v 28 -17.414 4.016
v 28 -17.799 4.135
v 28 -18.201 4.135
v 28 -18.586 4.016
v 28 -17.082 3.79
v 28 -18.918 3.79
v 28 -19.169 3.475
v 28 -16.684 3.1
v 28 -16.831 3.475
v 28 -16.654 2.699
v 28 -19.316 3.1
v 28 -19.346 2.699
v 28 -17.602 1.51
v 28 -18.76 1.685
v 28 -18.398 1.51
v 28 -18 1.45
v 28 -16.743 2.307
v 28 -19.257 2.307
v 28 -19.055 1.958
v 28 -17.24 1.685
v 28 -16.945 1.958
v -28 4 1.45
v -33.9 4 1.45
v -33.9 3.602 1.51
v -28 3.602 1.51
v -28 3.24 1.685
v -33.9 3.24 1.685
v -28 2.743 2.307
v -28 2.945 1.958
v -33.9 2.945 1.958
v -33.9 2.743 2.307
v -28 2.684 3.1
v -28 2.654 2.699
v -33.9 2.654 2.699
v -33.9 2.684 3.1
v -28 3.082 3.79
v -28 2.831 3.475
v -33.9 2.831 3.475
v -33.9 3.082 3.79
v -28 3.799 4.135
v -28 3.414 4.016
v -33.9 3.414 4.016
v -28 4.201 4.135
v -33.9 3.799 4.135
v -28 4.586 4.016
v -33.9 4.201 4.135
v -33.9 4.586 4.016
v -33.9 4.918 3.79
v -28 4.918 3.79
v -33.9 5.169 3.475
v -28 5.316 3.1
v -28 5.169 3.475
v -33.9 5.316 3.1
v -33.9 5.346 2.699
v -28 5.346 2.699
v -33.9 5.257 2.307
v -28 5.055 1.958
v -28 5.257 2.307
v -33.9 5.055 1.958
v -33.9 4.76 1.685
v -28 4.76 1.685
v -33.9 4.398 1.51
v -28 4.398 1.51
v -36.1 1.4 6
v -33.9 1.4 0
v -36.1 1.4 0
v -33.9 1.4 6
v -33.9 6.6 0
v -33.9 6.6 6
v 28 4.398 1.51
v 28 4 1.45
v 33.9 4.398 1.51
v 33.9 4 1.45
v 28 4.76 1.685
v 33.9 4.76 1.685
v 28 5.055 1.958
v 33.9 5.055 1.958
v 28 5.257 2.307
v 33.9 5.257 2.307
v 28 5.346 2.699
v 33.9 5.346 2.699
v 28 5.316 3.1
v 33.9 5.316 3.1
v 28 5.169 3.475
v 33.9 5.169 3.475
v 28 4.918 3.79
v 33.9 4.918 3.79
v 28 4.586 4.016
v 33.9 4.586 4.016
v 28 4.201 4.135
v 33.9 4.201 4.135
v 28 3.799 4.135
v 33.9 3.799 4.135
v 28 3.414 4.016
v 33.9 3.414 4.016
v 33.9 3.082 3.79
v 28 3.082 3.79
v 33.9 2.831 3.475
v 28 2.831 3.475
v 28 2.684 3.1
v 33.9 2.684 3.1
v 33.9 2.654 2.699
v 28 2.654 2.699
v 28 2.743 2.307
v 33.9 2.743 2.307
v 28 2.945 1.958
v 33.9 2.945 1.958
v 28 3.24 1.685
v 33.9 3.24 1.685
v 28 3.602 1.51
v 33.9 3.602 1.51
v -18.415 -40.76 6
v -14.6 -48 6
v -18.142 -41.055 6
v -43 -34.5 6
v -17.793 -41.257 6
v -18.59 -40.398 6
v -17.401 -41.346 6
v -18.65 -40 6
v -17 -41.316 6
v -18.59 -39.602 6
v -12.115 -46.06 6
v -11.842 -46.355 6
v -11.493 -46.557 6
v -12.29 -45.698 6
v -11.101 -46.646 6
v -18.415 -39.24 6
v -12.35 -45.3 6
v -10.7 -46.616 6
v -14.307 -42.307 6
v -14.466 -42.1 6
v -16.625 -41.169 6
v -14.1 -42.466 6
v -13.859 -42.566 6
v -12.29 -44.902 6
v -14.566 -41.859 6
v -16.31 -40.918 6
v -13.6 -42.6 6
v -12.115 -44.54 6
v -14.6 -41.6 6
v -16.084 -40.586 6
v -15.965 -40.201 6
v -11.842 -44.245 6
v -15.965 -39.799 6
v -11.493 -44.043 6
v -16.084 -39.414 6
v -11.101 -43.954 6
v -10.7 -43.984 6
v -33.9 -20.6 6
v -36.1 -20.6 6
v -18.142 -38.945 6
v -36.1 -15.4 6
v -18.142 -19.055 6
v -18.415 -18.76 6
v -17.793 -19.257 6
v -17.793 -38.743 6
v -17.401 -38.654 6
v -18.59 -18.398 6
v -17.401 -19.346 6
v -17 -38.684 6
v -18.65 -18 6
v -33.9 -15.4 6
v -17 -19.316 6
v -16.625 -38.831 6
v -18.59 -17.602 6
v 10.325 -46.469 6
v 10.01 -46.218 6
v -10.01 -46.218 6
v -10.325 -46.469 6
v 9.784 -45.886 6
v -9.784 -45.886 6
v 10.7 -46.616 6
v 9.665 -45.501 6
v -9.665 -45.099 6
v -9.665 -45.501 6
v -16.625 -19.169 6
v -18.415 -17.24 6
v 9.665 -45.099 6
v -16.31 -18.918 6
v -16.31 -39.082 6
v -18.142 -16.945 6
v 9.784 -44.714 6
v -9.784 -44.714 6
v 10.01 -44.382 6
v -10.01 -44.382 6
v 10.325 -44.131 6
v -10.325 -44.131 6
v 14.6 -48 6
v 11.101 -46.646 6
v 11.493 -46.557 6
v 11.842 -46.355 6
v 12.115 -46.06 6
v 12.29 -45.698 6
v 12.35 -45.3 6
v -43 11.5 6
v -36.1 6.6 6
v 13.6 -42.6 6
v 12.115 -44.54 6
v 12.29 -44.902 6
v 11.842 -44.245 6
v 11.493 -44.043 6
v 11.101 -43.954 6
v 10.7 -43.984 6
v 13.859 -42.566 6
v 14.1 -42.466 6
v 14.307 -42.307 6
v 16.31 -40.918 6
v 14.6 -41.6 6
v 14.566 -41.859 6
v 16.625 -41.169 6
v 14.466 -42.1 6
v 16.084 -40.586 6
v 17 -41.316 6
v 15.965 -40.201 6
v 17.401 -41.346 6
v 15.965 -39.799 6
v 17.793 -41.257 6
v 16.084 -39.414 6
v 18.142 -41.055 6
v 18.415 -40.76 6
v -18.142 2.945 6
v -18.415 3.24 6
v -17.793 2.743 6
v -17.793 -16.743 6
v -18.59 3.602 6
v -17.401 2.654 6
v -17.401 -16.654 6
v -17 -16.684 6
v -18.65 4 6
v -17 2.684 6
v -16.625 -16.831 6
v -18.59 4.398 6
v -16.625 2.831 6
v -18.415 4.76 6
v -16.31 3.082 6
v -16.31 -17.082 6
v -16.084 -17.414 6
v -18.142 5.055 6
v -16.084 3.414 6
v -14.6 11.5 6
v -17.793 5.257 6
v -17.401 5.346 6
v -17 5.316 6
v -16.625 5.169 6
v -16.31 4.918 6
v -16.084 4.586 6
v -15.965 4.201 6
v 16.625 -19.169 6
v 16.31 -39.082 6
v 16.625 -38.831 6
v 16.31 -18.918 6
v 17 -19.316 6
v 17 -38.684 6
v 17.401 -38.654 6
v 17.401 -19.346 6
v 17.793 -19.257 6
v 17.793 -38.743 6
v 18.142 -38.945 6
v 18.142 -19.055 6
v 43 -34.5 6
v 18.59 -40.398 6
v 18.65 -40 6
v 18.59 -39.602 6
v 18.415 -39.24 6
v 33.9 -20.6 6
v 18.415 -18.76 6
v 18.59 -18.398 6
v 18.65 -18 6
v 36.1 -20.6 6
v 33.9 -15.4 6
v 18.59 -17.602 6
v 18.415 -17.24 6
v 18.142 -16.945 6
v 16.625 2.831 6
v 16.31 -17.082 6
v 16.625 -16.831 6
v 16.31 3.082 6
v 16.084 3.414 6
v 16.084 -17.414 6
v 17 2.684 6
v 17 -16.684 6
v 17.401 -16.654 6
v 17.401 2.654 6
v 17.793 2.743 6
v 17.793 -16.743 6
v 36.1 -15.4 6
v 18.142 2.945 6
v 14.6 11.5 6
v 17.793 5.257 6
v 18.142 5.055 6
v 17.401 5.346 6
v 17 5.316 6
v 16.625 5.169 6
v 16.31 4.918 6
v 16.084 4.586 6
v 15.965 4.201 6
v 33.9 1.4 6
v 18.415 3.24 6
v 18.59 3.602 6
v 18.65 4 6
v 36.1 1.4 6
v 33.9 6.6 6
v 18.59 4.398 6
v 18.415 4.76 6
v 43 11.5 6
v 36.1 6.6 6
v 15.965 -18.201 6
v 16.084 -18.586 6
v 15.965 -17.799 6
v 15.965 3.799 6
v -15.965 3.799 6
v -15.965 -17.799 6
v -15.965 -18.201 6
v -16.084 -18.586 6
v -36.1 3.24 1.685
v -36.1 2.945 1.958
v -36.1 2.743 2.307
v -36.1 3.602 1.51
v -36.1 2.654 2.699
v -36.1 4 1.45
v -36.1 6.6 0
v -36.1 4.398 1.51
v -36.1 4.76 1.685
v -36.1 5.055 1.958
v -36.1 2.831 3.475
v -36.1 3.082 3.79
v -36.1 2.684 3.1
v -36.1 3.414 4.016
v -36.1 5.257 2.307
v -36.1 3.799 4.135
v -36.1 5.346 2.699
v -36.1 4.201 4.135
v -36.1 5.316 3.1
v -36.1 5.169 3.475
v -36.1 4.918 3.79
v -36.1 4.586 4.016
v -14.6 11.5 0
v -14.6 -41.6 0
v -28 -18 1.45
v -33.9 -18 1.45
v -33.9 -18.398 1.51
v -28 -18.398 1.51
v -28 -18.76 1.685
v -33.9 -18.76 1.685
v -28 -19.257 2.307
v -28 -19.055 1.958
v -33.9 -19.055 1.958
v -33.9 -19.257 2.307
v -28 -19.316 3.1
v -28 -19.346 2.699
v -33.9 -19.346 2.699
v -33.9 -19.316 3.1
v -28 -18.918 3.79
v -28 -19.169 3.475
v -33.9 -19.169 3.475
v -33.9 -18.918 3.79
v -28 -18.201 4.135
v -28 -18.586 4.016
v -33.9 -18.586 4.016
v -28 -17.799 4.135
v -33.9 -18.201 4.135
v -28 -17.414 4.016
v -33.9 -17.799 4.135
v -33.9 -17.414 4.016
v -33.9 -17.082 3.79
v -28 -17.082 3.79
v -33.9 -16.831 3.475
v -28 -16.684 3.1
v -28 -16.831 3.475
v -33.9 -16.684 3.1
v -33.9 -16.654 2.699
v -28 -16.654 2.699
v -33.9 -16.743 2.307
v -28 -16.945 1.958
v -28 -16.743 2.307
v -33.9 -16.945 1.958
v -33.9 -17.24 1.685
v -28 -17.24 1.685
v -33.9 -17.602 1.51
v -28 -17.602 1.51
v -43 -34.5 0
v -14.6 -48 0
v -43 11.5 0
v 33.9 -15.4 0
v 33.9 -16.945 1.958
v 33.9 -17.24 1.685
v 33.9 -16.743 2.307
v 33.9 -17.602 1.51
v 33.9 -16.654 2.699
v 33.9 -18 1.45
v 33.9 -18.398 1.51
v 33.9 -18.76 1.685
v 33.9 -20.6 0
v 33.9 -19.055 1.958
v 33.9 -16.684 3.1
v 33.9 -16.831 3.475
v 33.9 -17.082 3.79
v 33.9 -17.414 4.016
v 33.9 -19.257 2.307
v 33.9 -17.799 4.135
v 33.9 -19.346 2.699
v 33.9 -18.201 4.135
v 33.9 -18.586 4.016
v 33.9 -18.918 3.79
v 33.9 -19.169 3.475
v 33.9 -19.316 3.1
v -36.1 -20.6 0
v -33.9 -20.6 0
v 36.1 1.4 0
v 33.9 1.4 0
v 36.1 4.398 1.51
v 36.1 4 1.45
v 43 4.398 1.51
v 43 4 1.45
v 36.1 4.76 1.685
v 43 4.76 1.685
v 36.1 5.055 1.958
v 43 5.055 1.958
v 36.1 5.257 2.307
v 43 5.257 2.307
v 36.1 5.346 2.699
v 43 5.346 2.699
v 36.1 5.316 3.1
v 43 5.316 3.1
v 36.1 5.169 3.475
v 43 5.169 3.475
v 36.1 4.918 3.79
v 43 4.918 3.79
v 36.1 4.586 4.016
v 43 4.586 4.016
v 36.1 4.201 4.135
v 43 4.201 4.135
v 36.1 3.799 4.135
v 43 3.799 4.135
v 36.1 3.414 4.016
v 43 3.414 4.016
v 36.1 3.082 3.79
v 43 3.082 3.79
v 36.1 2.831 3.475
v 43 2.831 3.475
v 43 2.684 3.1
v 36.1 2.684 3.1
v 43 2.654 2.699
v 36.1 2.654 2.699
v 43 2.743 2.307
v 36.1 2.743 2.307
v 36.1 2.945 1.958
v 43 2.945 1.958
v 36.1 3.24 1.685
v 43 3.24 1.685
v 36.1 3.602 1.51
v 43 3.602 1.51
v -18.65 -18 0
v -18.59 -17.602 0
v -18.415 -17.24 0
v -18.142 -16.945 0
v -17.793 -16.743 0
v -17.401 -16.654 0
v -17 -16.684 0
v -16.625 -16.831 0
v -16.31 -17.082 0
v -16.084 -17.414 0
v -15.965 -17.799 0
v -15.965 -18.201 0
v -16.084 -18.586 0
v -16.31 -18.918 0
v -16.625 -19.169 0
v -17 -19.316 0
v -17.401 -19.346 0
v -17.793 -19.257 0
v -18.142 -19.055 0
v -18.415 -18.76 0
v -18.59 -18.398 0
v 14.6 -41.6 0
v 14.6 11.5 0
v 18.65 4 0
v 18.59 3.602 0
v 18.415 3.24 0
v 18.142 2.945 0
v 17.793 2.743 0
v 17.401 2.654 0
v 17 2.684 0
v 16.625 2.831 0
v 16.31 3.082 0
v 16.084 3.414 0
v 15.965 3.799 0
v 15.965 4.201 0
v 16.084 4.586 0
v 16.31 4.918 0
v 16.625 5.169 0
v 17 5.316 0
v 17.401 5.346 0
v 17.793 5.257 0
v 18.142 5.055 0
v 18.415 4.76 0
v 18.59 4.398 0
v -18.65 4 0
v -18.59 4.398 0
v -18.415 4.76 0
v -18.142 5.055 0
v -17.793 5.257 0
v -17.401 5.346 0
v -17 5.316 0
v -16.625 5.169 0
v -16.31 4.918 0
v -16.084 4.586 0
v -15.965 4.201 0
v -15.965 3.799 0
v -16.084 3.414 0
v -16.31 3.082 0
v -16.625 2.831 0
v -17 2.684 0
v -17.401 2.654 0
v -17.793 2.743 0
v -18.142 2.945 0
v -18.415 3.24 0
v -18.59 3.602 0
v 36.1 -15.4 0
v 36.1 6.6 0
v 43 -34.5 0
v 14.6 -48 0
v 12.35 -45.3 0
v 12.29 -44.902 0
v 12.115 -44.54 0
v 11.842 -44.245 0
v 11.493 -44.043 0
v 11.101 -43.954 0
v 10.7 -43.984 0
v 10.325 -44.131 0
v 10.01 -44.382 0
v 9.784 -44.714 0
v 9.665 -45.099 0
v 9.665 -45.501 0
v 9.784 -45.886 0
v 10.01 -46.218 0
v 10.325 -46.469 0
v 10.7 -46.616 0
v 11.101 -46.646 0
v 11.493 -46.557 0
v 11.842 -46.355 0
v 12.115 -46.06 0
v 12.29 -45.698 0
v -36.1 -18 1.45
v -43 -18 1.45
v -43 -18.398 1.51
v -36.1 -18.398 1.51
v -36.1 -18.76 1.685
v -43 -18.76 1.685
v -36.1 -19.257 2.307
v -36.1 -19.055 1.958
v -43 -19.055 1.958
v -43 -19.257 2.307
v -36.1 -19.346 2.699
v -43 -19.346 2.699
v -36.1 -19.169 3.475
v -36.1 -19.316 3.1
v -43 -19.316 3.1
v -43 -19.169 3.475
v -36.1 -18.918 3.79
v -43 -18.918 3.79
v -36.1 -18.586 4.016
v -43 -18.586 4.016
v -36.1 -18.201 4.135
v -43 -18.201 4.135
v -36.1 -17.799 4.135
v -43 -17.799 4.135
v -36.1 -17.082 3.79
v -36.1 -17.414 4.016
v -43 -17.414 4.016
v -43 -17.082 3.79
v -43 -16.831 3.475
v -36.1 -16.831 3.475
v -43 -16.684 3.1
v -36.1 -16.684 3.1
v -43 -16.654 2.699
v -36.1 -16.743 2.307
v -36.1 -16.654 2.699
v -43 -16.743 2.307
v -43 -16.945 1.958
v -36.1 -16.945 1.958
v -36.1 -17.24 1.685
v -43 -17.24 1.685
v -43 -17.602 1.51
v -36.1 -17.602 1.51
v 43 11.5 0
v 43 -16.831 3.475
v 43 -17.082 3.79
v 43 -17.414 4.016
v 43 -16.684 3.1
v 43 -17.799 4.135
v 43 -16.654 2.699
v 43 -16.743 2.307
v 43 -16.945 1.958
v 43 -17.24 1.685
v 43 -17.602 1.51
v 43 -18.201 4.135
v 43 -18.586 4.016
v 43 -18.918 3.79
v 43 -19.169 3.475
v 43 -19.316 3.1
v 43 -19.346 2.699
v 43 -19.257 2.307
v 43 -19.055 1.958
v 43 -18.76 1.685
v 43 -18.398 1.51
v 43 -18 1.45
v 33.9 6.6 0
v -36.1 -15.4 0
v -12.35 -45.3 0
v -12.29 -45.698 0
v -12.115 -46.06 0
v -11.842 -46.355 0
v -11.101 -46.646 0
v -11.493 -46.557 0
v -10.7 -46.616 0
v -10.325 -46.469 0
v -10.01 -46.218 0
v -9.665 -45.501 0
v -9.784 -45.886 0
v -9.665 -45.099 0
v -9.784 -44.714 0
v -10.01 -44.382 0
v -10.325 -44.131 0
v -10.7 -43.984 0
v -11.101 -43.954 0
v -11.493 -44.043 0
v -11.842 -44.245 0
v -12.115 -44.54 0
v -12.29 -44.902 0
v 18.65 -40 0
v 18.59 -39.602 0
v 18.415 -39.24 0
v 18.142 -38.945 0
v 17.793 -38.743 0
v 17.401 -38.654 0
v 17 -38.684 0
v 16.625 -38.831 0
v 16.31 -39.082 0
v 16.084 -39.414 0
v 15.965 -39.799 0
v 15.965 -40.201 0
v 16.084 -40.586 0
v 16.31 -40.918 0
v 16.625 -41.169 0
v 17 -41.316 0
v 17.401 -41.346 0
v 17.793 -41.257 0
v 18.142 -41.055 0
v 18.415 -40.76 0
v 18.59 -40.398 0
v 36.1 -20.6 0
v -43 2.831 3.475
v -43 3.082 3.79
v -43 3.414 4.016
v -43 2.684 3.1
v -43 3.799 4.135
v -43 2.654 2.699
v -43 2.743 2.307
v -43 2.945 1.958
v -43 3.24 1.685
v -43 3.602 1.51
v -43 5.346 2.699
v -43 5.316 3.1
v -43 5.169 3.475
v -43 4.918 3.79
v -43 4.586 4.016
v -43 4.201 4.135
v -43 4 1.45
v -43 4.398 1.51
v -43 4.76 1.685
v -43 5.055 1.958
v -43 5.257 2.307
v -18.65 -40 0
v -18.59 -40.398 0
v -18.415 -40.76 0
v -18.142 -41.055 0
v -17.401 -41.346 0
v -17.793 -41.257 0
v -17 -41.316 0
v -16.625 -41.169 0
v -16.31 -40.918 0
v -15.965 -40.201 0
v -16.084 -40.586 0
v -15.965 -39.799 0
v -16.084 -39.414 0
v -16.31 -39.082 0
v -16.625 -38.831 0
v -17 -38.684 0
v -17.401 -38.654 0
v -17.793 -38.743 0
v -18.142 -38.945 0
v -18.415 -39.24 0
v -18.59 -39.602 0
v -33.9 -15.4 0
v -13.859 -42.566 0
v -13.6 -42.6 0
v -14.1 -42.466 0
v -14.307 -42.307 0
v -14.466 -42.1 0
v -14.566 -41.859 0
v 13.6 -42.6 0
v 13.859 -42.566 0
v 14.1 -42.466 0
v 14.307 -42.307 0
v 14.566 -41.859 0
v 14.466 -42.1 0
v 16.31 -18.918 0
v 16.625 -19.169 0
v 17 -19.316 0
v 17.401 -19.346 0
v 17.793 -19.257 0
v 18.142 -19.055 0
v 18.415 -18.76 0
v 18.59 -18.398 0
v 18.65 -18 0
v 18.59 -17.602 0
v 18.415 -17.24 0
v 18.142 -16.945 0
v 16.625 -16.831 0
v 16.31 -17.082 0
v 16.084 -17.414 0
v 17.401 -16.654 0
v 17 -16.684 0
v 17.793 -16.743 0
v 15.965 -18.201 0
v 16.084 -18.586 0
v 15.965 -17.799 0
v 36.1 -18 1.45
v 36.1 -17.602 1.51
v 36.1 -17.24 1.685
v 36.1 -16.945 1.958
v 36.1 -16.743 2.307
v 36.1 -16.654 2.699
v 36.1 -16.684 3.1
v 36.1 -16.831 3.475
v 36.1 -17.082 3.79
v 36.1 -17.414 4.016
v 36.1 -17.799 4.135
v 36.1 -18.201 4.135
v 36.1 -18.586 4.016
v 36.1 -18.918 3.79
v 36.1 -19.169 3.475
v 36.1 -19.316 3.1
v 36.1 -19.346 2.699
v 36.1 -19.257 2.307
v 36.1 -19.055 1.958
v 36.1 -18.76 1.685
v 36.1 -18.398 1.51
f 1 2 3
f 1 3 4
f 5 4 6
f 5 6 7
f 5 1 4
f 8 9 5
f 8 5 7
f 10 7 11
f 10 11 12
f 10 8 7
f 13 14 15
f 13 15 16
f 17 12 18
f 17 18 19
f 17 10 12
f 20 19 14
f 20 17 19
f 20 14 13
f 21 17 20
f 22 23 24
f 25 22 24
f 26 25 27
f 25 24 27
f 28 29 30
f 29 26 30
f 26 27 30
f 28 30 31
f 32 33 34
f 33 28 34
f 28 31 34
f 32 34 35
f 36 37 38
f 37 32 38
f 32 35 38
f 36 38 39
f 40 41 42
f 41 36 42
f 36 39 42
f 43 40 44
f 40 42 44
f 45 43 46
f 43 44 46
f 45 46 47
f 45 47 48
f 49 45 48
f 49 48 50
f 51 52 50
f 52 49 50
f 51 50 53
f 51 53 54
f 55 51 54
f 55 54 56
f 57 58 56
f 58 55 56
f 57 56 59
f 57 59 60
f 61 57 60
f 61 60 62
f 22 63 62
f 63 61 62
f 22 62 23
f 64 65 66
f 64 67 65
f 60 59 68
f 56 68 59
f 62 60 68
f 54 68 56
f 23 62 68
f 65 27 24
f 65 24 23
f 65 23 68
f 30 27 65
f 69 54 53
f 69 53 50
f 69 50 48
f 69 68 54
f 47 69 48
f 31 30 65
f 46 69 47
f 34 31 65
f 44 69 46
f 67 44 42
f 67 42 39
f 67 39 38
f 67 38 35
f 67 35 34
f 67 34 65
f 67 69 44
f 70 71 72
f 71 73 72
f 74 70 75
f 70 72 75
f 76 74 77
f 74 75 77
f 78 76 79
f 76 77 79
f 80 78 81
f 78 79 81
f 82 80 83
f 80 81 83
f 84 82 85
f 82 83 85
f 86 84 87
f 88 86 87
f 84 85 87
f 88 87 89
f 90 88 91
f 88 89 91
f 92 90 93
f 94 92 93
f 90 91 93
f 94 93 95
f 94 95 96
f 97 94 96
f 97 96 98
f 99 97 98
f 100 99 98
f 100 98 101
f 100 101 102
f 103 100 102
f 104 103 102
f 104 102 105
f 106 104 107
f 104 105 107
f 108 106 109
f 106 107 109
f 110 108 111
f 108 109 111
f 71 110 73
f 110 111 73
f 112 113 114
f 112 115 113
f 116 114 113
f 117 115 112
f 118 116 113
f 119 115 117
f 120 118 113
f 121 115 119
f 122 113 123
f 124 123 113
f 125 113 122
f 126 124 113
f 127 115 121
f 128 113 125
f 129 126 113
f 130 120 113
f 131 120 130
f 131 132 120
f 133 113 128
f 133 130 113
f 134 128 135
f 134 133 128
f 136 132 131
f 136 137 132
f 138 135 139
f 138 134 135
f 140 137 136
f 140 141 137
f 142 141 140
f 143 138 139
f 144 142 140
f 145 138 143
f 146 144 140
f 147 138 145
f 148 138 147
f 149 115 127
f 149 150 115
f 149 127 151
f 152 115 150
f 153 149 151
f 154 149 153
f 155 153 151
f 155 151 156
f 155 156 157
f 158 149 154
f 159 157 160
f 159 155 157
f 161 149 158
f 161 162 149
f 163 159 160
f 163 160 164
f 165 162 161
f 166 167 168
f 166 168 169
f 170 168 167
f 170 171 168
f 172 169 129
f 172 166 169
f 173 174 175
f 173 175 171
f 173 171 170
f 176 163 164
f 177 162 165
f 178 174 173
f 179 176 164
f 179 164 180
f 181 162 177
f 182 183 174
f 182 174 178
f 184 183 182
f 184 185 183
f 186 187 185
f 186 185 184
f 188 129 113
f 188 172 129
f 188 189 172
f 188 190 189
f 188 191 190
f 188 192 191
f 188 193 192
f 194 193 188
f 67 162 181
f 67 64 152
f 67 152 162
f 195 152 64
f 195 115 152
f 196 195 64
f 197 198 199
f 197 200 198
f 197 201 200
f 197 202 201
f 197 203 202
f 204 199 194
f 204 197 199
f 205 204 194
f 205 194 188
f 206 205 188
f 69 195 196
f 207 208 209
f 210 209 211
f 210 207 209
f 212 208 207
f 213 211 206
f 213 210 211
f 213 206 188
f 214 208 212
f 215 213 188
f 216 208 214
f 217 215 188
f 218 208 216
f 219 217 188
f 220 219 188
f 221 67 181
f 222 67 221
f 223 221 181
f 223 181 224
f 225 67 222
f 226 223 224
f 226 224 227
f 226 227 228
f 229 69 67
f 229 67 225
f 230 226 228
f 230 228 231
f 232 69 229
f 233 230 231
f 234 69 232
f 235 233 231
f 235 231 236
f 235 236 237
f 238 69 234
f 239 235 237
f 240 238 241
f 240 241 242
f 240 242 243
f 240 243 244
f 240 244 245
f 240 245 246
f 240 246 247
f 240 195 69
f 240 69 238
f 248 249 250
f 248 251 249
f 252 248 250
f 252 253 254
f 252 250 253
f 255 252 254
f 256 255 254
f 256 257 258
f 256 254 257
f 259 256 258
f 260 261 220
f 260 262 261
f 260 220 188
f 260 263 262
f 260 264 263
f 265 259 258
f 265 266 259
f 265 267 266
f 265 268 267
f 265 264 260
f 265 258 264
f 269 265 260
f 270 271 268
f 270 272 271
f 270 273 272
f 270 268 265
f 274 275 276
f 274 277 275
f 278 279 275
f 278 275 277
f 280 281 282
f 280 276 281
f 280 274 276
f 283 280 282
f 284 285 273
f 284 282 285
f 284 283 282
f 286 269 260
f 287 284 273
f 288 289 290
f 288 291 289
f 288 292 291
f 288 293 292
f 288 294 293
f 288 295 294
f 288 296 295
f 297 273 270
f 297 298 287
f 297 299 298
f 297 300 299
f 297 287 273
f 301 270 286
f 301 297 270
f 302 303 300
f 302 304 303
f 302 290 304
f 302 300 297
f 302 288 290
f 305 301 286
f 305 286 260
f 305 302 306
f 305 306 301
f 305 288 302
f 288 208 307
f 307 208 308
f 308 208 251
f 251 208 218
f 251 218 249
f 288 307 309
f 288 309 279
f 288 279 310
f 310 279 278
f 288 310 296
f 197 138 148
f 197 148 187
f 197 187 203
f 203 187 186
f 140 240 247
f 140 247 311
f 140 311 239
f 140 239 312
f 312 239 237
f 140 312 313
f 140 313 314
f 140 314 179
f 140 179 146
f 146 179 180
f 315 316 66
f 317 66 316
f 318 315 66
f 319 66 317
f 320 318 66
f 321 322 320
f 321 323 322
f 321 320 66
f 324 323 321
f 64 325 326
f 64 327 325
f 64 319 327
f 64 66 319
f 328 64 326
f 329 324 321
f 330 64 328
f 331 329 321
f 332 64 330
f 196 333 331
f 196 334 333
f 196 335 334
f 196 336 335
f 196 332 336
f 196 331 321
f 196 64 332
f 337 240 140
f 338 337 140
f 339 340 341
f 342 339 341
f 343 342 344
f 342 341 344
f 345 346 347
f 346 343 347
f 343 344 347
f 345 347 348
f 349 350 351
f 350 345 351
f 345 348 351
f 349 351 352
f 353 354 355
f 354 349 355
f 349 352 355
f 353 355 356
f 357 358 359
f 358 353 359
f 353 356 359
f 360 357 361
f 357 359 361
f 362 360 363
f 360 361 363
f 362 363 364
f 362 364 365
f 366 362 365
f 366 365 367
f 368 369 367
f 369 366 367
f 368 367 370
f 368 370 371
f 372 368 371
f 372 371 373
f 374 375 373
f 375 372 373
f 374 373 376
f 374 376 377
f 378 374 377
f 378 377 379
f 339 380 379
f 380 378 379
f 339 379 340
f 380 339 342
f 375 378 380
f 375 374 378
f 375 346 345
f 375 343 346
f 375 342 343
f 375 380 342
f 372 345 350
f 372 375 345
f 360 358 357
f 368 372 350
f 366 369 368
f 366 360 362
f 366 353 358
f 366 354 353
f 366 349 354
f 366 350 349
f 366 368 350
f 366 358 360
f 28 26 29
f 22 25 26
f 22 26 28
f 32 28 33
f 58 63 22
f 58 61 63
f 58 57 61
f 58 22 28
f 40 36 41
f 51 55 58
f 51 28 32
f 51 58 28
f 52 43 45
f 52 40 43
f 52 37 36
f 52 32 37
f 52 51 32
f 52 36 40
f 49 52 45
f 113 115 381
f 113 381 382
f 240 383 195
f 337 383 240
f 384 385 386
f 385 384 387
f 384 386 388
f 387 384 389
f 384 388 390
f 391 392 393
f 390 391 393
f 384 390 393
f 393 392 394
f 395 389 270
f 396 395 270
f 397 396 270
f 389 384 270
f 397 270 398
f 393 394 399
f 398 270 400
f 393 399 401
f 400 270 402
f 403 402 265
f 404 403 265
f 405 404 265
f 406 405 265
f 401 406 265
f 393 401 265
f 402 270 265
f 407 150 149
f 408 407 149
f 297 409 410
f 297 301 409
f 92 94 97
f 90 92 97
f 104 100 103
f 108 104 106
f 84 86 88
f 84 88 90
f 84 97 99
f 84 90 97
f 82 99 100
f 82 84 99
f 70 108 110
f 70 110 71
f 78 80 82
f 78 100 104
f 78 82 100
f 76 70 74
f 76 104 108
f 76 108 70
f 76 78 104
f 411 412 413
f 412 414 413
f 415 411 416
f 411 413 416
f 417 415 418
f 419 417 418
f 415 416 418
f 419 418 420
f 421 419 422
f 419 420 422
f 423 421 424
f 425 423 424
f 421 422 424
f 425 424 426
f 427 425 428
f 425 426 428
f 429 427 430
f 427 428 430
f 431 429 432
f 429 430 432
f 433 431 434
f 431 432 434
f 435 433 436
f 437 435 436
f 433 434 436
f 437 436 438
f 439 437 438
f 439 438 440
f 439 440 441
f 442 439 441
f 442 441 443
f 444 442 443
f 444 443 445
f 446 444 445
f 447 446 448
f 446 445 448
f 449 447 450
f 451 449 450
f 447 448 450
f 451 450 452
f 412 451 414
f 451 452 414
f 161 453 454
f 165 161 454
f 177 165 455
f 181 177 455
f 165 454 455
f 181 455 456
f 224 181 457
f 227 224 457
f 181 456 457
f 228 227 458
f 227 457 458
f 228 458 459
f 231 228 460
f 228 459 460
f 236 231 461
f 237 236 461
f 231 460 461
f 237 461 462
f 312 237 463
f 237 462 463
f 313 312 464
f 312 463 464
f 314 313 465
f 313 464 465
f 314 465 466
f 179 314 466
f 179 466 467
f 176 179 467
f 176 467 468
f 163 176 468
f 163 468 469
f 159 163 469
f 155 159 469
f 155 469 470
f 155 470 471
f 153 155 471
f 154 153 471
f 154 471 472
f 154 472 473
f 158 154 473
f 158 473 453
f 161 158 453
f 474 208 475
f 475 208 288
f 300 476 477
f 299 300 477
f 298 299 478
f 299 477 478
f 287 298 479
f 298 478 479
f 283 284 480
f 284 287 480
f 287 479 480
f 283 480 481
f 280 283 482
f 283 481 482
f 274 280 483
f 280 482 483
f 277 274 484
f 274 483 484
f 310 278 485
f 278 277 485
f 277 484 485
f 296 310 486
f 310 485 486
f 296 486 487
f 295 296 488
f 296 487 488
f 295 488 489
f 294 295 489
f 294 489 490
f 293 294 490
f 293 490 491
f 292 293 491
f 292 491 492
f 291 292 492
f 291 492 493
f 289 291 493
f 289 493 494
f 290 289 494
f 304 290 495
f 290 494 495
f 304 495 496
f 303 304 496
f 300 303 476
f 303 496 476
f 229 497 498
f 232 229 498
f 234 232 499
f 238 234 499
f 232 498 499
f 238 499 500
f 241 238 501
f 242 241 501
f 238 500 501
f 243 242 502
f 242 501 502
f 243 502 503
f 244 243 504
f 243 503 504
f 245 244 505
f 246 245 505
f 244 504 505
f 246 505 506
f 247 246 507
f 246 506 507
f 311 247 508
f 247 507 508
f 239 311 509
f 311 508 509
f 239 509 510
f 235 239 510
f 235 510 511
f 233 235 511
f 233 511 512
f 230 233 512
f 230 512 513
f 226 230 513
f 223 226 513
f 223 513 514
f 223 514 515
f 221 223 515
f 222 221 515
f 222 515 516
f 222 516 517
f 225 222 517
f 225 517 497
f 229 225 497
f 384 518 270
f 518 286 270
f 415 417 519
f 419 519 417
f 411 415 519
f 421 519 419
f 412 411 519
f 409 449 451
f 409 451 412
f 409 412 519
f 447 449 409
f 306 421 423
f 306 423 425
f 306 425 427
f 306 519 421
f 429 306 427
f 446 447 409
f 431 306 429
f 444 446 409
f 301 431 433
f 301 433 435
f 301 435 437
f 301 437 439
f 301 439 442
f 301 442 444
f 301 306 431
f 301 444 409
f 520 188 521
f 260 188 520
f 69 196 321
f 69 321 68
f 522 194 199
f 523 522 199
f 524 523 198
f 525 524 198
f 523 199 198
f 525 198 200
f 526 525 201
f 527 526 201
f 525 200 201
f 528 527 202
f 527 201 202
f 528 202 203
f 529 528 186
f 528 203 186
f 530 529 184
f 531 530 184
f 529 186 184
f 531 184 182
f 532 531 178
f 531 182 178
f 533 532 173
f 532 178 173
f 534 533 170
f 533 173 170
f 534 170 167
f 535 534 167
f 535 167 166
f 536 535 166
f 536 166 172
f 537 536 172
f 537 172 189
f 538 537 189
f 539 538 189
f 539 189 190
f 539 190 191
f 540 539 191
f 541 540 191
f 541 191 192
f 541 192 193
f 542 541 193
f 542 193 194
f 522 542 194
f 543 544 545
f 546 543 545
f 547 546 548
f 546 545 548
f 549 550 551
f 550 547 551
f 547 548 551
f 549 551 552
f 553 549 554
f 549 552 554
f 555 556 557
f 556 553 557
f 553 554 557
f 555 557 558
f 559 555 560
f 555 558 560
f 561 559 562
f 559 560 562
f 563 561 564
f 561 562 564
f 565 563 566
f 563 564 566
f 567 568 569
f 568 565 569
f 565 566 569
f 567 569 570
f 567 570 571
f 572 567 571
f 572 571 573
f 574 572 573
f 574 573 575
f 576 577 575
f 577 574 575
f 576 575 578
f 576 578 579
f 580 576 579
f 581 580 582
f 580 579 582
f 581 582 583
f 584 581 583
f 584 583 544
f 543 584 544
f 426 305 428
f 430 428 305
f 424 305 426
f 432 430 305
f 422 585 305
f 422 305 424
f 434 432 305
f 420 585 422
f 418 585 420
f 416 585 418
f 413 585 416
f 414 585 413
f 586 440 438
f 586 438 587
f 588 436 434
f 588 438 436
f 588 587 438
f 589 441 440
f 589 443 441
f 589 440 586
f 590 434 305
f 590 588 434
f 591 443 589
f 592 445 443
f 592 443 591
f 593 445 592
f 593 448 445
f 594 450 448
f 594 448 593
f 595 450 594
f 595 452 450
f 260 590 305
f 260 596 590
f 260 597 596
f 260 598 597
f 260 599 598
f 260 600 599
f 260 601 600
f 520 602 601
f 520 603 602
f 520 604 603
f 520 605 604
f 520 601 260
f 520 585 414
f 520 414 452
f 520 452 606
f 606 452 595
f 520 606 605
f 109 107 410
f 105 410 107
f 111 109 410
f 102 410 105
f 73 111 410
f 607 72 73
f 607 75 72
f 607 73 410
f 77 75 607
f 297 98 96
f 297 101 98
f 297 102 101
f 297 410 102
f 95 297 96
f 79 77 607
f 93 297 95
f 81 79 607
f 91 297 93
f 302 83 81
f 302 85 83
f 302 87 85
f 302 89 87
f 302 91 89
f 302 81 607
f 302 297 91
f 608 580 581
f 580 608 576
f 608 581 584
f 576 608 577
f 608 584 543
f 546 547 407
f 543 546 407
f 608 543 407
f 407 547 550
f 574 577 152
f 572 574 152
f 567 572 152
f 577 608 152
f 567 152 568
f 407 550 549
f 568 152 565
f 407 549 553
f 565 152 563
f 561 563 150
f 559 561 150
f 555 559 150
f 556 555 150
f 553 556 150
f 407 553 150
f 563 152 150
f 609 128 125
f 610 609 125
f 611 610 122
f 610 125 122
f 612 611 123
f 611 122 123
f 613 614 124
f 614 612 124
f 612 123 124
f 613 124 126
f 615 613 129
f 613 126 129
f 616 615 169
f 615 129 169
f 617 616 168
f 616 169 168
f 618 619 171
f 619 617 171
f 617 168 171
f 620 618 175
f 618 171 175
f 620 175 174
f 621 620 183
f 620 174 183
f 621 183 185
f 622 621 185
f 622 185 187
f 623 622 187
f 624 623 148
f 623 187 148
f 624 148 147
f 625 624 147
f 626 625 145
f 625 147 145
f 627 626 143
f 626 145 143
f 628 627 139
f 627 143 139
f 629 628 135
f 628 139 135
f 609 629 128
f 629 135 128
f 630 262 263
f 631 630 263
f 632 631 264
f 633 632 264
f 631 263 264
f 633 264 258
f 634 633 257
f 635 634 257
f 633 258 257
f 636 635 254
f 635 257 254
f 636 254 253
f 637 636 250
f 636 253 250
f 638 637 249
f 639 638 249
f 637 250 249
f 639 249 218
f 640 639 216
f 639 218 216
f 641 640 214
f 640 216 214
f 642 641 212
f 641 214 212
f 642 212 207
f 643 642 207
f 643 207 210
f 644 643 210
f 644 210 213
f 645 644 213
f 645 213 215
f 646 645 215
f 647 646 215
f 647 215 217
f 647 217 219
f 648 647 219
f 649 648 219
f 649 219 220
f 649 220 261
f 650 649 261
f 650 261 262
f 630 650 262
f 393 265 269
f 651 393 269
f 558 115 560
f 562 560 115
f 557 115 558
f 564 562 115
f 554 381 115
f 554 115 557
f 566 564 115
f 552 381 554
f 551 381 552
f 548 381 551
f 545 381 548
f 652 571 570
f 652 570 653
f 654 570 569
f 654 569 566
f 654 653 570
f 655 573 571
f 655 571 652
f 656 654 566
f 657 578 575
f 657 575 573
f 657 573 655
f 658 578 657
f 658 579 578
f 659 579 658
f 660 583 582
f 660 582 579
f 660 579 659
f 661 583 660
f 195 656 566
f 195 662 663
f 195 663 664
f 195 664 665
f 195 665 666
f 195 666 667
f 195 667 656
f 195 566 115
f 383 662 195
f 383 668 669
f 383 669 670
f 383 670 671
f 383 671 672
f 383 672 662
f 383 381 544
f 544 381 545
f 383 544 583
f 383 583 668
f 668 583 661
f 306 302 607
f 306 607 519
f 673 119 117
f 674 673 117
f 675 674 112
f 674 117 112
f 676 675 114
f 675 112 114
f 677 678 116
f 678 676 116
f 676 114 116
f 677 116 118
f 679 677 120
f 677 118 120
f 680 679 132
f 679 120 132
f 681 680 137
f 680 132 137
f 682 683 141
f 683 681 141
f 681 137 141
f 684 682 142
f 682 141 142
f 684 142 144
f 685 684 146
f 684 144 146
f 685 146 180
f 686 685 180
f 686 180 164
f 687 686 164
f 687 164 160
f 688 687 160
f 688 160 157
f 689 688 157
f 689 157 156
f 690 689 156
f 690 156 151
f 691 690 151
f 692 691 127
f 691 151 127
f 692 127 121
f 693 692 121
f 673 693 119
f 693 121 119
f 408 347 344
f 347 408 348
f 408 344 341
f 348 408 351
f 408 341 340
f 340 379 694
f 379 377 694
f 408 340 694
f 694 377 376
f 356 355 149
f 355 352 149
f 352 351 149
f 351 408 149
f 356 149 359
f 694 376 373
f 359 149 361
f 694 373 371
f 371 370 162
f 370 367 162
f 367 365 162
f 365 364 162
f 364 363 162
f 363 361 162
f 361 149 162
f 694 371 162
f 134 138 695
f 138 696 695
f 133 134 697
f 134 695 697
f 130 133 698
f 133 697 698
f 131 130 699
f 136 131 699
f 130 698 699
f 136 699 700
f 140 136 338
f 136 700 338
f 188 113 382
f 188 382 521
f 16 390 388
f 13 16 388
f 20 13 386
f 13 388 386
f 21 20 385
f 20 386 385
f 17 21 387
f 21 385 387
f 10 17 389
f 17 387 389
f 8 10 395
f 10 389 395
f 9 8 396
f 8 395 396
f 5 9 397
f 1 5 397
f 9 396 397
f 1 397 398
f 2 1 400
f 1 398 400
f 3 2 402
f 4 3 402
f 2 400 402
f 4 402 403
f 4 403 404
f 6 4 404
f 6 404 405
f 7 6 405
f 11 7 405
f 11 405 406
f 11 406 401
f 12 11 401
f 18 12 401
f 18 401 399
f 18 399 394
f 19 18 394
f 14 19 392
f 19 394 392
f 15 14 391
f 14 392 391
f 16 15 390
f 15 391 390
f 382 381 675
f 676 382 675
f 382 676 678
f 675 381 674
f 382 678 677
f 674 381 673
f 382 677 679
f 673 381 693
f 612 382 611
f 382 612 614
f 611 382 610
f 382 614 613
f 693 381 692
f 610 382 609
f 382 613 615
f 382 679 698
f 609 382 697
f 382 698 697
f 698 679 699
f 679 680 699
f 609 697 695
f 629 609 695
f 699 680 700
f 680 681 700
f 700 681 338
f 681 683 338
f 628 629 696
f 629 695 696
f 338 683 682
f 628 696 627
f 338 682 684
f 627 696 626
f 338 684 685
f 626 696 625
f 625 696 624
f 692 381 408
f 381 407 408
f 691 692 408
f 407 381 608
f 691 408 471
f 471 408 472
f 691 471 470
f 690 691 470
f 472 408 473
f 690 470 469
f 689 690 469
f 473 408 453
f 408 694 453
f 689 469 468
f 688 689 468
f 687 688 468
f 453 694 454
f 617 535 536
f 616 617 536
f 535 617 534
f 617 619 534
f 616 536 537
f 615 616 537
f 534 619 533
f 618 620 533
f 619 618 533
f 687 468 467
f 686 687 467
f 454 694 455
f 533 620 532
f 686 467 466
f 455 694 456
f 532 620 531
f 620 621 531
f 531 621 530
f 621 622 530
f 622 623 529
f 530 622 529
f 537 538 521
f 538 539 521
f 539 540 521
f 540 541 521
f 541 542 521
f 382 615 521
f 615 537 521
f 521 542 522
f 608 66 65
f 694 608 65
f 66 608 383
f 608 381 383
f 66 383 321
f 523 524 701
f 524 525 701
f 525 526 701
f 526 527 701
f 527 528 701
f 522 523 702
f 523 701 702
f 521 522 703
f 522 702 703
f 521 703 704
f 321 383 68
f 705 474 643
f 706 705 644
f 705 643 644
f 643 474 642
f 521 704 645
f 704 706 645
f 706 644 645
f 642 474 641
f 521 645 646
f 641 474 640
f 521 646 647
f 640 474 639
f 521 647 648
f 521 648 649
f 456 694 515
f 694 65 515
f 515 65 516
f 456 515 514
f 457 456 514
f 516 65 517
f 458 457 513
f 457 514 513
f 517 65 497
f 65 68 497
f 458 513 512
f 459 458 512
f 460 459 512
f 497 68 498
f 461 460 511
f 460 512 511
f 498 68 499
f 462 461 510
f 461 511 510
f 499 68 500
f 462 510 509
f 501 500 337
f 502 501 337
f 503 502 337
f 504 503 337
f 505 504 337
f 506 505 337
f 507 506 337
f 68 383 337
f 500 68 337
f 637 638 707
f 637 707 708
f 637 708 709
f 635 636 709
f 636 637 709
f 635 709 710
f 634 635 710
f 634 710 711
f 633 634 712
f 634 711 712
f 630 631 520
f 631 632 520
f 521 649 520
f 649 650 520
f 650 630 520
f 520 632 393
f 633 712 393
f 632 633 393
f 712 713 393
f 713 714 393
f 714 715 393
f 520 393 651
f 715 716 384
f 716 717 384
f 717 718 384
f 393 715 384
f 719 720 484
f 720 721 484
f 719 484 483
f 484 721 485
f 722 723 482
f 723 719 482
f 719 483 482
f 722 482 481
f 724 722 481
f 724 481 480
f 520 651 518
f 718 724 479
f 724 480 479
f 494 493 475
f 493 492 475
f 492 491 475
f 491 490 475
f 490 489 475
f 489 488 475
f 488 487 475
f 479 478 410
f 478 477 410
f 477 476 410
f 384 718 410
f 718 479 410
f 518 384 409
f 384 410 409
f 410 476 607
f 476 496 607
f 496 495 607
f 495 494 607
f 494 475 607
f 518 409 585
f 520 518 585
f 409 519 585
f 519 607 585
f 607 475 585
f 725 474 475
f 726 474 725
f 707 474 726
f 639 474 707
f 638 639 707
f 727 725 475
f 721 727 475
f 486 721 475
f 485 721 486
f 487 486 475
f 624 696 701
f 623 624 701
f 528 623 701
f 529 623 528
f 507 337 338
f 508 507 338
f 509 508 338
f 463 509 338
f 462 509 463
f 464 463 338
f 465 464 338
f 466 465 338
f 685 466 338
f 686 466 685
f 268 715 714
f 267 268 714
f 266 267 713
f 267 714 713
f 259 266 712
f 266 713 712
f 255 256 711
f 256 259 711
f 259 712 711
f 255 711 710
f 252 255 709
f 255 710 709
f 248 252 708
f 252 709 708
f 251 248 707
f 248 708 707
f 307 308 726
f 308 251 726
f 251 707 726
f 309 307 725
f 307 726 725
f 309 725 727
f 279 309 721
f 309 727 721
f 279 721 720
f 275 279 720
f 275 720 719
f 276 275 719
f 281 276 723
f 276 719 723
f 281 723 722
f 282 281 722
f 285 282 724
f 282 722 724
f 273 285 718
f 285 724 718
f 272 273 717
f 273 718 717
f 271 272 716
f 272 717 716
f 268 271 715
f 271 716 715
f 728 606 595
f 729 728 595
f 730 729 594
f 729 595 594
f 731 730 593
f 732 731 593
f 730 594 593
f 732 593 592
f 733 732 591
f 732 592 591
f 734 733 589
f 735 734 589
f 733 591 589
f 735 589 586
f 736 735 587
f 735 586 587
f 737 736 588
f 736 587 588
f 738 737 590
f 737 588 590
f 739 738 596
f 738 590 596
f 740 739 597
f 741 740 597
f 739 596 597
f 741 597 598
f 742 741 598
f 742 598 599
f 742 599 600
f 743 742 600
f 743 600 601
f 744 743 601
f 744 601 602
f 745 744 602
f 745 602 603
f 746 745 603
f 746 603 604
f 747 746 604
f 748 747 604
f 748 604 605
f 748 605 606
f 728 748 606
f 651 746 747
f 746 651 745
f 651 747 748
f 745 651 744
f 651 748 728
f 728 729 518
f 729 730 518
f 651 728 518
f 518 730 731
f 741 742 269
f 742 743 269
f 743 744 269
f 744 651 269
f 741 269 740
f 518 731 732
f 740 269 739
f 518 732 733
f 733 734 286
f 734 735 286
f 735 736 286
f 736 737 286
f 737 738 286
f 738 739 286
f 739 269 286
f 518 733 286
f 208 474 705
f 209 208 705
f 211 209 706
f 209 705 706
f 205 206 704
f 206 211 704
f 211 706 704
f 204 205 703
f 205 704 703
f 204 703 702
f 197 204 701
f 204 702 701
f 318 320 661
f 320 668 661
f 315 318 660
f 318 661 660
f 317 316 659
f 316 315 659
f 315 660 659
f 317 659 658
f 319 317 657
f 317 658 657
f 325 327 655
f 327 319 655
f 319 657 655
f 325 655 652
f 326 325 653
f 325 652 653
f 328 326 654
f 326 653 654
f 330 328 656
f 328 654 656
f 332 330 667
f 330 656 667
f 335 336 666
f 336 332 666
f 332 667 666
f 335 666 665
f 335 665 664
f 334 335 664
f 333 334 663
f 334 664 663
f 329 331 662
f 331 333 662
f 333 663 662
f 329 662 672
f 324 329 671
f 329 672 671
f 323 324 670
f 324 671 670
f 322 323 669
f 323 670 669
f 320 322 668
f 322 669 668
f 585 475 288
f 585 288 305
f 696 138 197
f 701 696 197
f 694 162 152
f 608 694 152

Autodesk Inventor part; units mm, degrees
ref_plane "YZ Plane" through (0, 0, 0) normal (1, 0, 0) x (0, 1, 0)
ref_plane "XZ Plane" through (0, 0, 0) normal (0, 1, 0) x (-1, 0, 0)
ref_plane "XY Plane" through (0, 0, 0) normal (0, 0, 1) x (1, 0, 0)
ref_plane "작업 평면1" through (0, 0, 0) normal (0, 0, 1) x (1, 0, 0)
sketch "스케치1" plane through (0, 0, 0) normal (0, 0, 1) x (1, 0, 0)
  arc A0 (20.1, 4.5766) -> (19.5808, 6.2636) centre (17.1, 4.5766) ccw projected
  line L0 (19.5808, 6.2636) -> (15.5953, 12.1246) projected
  arc A1 (15.5953, 12.1246) -> (13.9414, 13) centre (13.9414, 11) ccw projected
  line L1 (13, 13) -> (13.9414, 13) projected
  arc A2 (14.5, 11.5) -> (13, 13) centre (13, 11.5) ccw projected
  line L2 (14.5, -41.5) -> (14.5, 11.5) projected
  arc A3 (13.5, -42.5) -> (14.5, -41.5) centre (13.5, -41.5) ccw projected
  line L3 (-13.5, -42.5) -> (13.5, -42.5) projected
  arc A4 (-14.5, -41.5) -> (-13.5, -42.5) centre (-13.5, -41.5) ccw projected
  line L4 (-14.5, 11.5) -> (-14.5, -41.5) projected
  arc A5 (-13, 13) -> (-14.5, 11.5) centre (-13, 11.5) ccw projected
  line L5 (-13.9414, 13) -> (-13, 13) projected
  arc A6 (-13.9414, 13) -> (-15.5953, 12.1246) centre (-13.9414, 11) ccw projected
  line L6 (-15.5953, 12.1246) -> (-19.5808, 6.2636) projected
  arc A7 (-19.5808, 6.2636) -> (-20.1, 4.5766) centre (-17.1, 4.5766) ccw projected
  line L7 (-20.1, 4.5766) -> (-20.1, -39.6766) projected
  arc A8 (-20.1, -39.6766) -> (-19.5808, -41.3636) centre (-17.1, -39.6766) ccw projected
  line L8 (-19.5808, -41.3636) -> (-15.8929, -46.7869) projected
  arc A9 (-15.8929, -46.7869) -> (-13.4121, -48.1) centre (-13.4121, -45.1) ccw projected
  line L9 (-13.4121, -48.1) -> (13.4121, -48.1) projected
  arc A10 (13.4121, -48.1) -> (15.8929, -46.7869) centre (13.4121, -45.1) ccw projected
  line L10 (15.8929, -46.7869) -> (19.5808, -41.3636) projected
  arc A11 (19.5808, -41.3636) -> (20.1, -39.6766) centre (17.1, -39.6766) ccw projected
  line L11 (20.1, -39.6766) -> (20.1, 4.5766) projected
  circle A12 centre (-17.3, 4) radius 1.35 projected
  circle A13 centre (-17.3, -18) radius 1.35 projected
  circle A14 centre (-11, -45.3) radius 1.35 projected
  circle A15 centre (17.3, 4) radius 1.35 projected
  circle A16 centre (17.3, -18) radius 1.35 projected
  circle A17 centre (11, -45.3) radius 1.35 projected
  circle A18 centre (-17.3, -40) radius 1.35 projected
  circle A19 centre (17.3, -40) radius 1.35 projected
  arc A20 (14.6, 11.5) -> (12.2254, 12.9) centre (13, 11.5) ccw
  line L12 (12.2254, 12.9) -> (13.9414, 12.9)
  arc A21 (15.5126, 12.0684) -> (13.9414, 12.9) centre (13.9414, 11) ccw
  line L13 (15.5126, 12.0684) -> (15.8991, 11.5)
  line L14 (19.3671, -41.5) -> (15.8102, -46.7307)
  arc A22 (13.4121, -48) -> (15.8102, -46.7307) centre (13.4121, -45.1) ccw
  line L15 (13.4121, -48) -> (-13.4121, -48)
  arc A23 (-15.8102, -46.7307) -> (-13.4121, -48) centre (-13.4121, -45.1) ccw
  line L16 (-15.8102, -46.7307) -> (-19.4981, -41.3073)
  arc A24 (-20, -39.6766) -> (-19.4981, -41.3073) centre (-17.1, -39.6766) ccw
  line L17 (-20, -39.6766) -> (-20, 4.5766)
  arc A25 (-19.4981, 6.2073) -> (-20, 4.5766) centre (-17.1, 4.5766) ccw
  line L18 (-19.4981, 6.2073) -> (-15.5126, 12.0684)
  arc A26 (-13.9414, 12.9) -> (-15.5126, 12.0684) centre (-13.9414, 11) ccw
  line L19 (-13.9414, 12.9) -> (-12.2254, 12.9)
  arc A27 (-12.2254, 12.9) -> (-14.6, 11.5) centre (-13, 11.5) ccw
  line L20 (-14.6, 11.5) -> (-14.6, -41.5)
  arc A28 (-14.6, -41.5) -> (-13.5, -42.6) centre (-13.5, -41.5) ccw
  line L21 (-13.5, -42.6) -> (13.5, -42.6)
  arc A29 (13.5, -42.6) -> (14.6, -41.5) centre (13.5, -41.5) ccw
  line L22 (14.6, -41.5) -> (14.6, 11.5)
  line L23 (14.6, 11.5) -> (39.6, 11.5)
  line L24 (39.6, -41.5) -> (14.6, -41.5)
  line L25 (14.6, -41.5) -> (14.6, 11.5)
  circle A30 centre (17.3, 4) radius 1.35
  circle A31 centre (17.3, -18) radius 1.35
  line L26 (45.5, -39.6766) -> (45.5, -37.525) projected
  line L27 (47.5, -37.525) -> (45.5, -37.525) projected
  line L28 (47.5, -36.025) -> (47.5, -37.525) projected
  line L29 (47.5, -36.025) -> (45, -36.025) projected
  line L30 (45, -36.025) -> (45, -21.975) projected
  line L31 (47.5, -21.975) -> (45, -21.975) projected
  line L32 (47.5, -21.975) -> (47.5, -20.475) projected
  line L33 (47.5, -20.475) -> (45.5, -20.475) projected
  line L34 (45.5, -20.475) -> (45.5, -15.525) projected
  line L35 (47.5, -15.525) -> (45.5, -15.525) projected
  line L36 (47.5, -15.525) -> (47.5, -14.025) projected
  line L37 (47.5, -14.025) -> (45, -14.025) projected
  line L38 (45, -14.025) -> (45, 0.025) projected
  line L39 (47.5, 0.025) -> (45, 0.025) projected
  line L40 (47.5, 0.025) -> (47.5, 1.525) projected
  line L41 (47.5, 1.525) -> (45.5, 1.525) projected
  line L42 (45.5, 1.525) -> (45.5, 4.5766) projected
  line L43 (43, 4.5766) -> (45.5, 4.5766) projected
  line L44 (43, -39.6766) -> (43, 4.5766) projected
  line L45 (43, -39.6766) -> (45.5, -39.6766) projected
  line L46 (14.6, 11.5) -> (43, 11.5)
  line L47 (43, 11.5) -> (43, -41.5)
  line L48 (43, -41.5) -> (14.6, -41.5)
  line L49 (14.6, -41.5) -> (14.6, 11.5)
  line L50 (45.5, -19.35) -> (45.5, -16.65) projected
  line L51 (43, -19.35) -> (43, -16.65) projected
  line L52 (43, -19.35) -> (43, -16.65) projected
  line L53 (43, -19.35) -> (43, -16.65) projected
  line L54 (47.5, -18) -> (45.5, -18) projected
  line L55 (47.5, 4) -> (45.5, 4) projected
  line L56 (33.5, 1) -> (36.5, 7) construction
  line L57 (36.5, 1) -> (33.5, 7) construction
  line L58 (33.9, 1.4) -> (36.1, 6.6) construction
  point P0 (0, 0)
  point P1 (19.488, -41.5)
  point P2 (16.02, 11.5)
  dimension "d0" = 0.1
  dimension "d1" = 25
  dimension "d2" = 53
  dimension "d3" = 2.7
  dimension "d4" = 2.7
  dimension "d5" = 3
  dimension "d6" = 6
extrude "돌출4" add sketch "스케치1" along normal blind 6 contours L11 A11 L10 L24 L22 L23 L0 A0 | A0 L0 L23 L46 L47 L44 L48 L24 L10 A11 L11 | A19
sketch "스케치3" plane through (43, -41.5, 0) normal (1, 0, 0) x (0, 0, -1)
  arc A0 (-5.0808, 47.7636) -> (-5.6, 46.0766) centre (-2.6, 46.0766) ccw projected
  line L0 (-5.6, 1.8234) -> (-5.6, 46.0766) projected
  arc A1 (-5.6, 1.8234) -> (-5.0808, 0.1364) centre (-2.6, 1.8234) ccw projected
  line L1 (-1.3929, -5.2869) -> (-5.0808, 0.1364) projected
  arc A2 (-1.3929, -5.2869) -> (1.0879, -6.6) centre (1.0879, -3.6) ccw projected
  line L2 (27.9121, -6.6) -> (1.0879, -6.6) projected
  arc A3 (27.9121, -6.6) -> (30.3929, -5.2869) centre (27.9121, -3.6) ccw projected
  line L3 (34.0808, 0.1364) -> (30.3929, -5.2869) projected
  arc A4 (34.0808, 0.1364) -> (34.6, 1.8234) centre (31.6, 1.8234) ccw projected
  line L4 (34.6, 46.0766) -> (34.6, 1.8234) projected
  arc A5 (34.6, 46.0766) -> (34.0808, 47.7636) centre (31.6, 46.0766) ccw projected
  line L5 (30.0953, 53.6246) -> (34.0808, 47.7636) projected
  arc A6 (30.0953, 53.6246) -> (28.4414, 54.5) centre (28.4414, 52.5) ccw projected
  line L6 (22.15, 54.5) -> (28.4414, 54.5) projected
  arc A7 (23.65, 53) -> (22.15, 54.5) centre (22.15, 53) ccw projected
  line L7 (23.65, 53) -> (23.65, 51.5) projected
  arc A8 (23.65, 51.5) -> (26, 49.15) centre (26, 51.5) ccw projected
  line L8 (26, 49.15) -> (28, 49.15) projected
  arc A9 (29, 48.15) -> (28, 49.15) centre (28, 48.15) ccw projected
  line L9 (29, 48.15) -> (29, 5.35) projected
  arc A10 (28, 4.35) -> (29, 5.35) centre (28, 5.35) ccw projected
  line L10 (28, 4.35) -> (26, 4.35) projected
  arc A11 (26, 4.35) -> (23.65, 2) centre (26, 2) ccw projected
  line L11 (23.65, 2) -> (23.65, 0) projected
  arc A12 (22.65, -1) -> (23.65, 0) centre (22.65, 0) ccw projected
  line L12 (22.65, -1) -> (6.35, -1) projected
  arc A13 (5.35, 0) -> (6.35, -1) centre (6.35, 0) ccw projected
  line L13 (5.35, 0) -> (5.35, 2) projected
  arc A14 (5.35, 2) -> (3, 4.35) centre (3, 2) ccw projected
  line L14 (3, 4.35) -> (1, 4.35) projected
  arc A15 (0, 5.35) -> (1, 4.35) centre (1, 5.35) ccw projected
  line L15 (0, 5.35) -> (0, 48.15) projected
  arc A16 (1, 49.15) -> (0, 48.15) centre (1, 48.15) ccw projected
  line L16 (1, 49.15) -> (3, 49.15) projected
  arc A17 (3, 49.15) -> (5.35, 51.5) centre (3, 51.5) ccw projected
  line L17 (5.35, 51.5) -> (5.35, 53) projected
  arc A18 (6.85, 54.5) -> (5.35, 53) centre (6.85, 53) ccw projected
  line L18 (0.5586, 54.5) -> (6.85, 54.5) projected
  arc A19 (0.5586, 54.5) -> (-1.0953, 53.6246) centre (0.5586, 52.5) ccw projected
  line L19 (-5.0808, 47.7636) -> (-1.0953, 53.6246) projected
  circle A20 centre (31.8, 45.5) radius 1.35 projected
  circle A21 centre (31.8, 23.5) radius 1.35 projected
  circle A22 centre (25.5, -3.8) radius 1.35 projected
  circle A23 centre (-2.8, 45.5) radius 1.35 projected
  circle A24 centre (-2.8, 23.5) radius 1.35 projected
  circle A25 centre (3.5, -3.8) radius 1.35 projected
  circle A26 centre (31.8, 1.5) radius 1.35 projected
  circle A27 centre (-2.8, 1.5) radius 1.35 projected
  circle A28 centre (-2.8, 45.5) radius 1.35
  circle A29 centre (-2.8, 23.5) radius 1.35
  point P0 (0, 41.5)
extrude "돌출5" cut sketch "스케치3" against normal blind 15 contours A23 | A24
sketch "스케치4" plane through (0, 0, 6) normal (0, 0, 1) x (1, 0, 0)
  line L0 (36.1, 1.4) -> (33.9, 1.4)
  line L1 (33.9, 1.4) -> (33.9, 6.6)
  line L2 (33.9, 6.6) -> (36.1, 6.6)
  line L3 (36.1, 6.6) -> (36.1, 1.4)
  line L4 (36.1, 1.4) -> (33.9, 6.6) construction
  line L5 (33.9, 1.4) -> (36.1, 6.6) construction
  line L6 (43, -16.65) -> (28, -16.65) projected
  line L7 (43, -19.35) -> (28, -19.35) projected
  line L8 (33.9, -20.6) -> (36.1, -20.6)
  line L9 (36.1, -20.6) -> (36.1, -15.4)
  line L10 (36.1, -15.4) -> (33.9, -15.4)
  line L11 (33.9, -15.4) -> (33.9, -20.6)
  line L12 (33.9, -20.6) -> (36.1, -15.4) construction
  line L13 (36.1, -20.6) -> (33.9, -15.4) construction
  point P0 (0, 0)
  point P1 (35, 4)
  point P2 (35, -18)
  dimension "d22" = 2.2
  dimension "d23" = 5.2
  dimension "d24" = 2.2
  dimension "d25" = 5.2
extrude "돌출6" cut sketch "스케치4" against normal blind 6
sketch "스케치5" plane through (0, 0, 6) normal (0, 0, 1) x (1, 0, 0)
  line L0 (33.9, 1.4) -> (33.9, 6.6) projected
  line L1 (33.9, 6.6) -> (36.1, 6.6) projected
  line L2 (36.1, 6.6) -> (36.1, 1.4) projected
  line L3 (36.1, 1.4) -> (33.9, 1.4) projected
  line L4 (36.1, -20.6) -> (33.9, -20.6) projected
  line L5 (33.9, -20.6) -> (33.9, -15.4) projected
  line L6 (33.9, -15.4) -> (36.1, -15.4) projected
  line L7 (36.1, -15.4) -> (36.1, -20.6) projected
  line L8 (14.6, -41.5) -> (43, -41.5) projected
  line L9 (43, -41.5) -> (43, 11.5) projected
  line L10 (43, 11.5) -> (14.6, 11.5) projected
  line L11 (14.6, 11.5) -> (14.6, -41.5) projected
  circle A0 centre (17.3, 4) radius 1.35 projected
  circle A1 centre (17.3, -18) radius 1.35 projected
  line L12 (43, -41.5) -> (14.6, -41.5)
  line L13 (14.6, -41.5) -> (14.6, -34.5)
  line L14 (14.6, -34.5) -> (43, -34.5)
  line L15 (43, -34.5) -> (43, -41.5)
  point P0 (0, 0)
  dimension "d28" = 7
extrude "돌출7" cut sketch "스케치5" against normal blind 10 contours L11 L14 L9 L8
sketch "스케치7" plane through (0, 0, 6) normal (0, 0, 1) x (1, 0, 0)
  circle A0 centre (17.3, -40) radius 1.35
  circle A1 centre (11, -45.3) radius 1.35
  circle A2 centre (-11, -45.3) radius 1.35
  circle A3 centre (-17.3, -40) radius 1.35
  line L0 (-13.4121, -48.1) -> (13.4121, -48.1)
  line L1 (-13, -42.5) -> (13, -42.5)
  line L2 (20.1, -39.6766) -> (20.1, 4.5766)
  line L3 (14.5, -41) -> (14.5, 11)
  line L4 (14.6, 11.5) -> (14.6, -34.5) projected
  line L5 (14.6, -34.5) -> (43, -34.5) projected
  line L6 (20, -39.6766) -> (20, 4.5766)
  line L7 (14.6, -41) -> (14.6, 11)
  line L8 (-13, -42.6) -> (13, -42.6)
  line L9 (-13.4121, -48) -> (13.4121, -48)
  line L10 (14.6, -34.5) -> (20, -34.5)
  line L11 (20, -34.5) -> (20, -42.6)
  line L12 (14.6, -42.6) -> (14.6, -34.5)
  line L13 (14.6, -42.6) -> (0, -42.6)
  line L14 (0, -42.6) -> (0, -48)
  line L15 (0, -48) -> (14.6, -48)
  line L16 (20, -42.6) -> (14.6, -48)
  circle A4 centre (17.3, -40) radius 1.35
  circle A5 centre (11, -45.3) radius 1.35
  point P0 (0, 0)
  point P1 (41, -34.5)
  point P2 (20, -34.5)
  point P3 (13, -42.6)
  point P4 (0, -42.6)
  point P5 (13.4121, -48)
  dimension "d33" = 0.1
  dimension "d35" = 0.1
  dimension "d36" = 0.1
  dimension "d37" = 0.1
extrude "돌출8" add sketch "스케치7" against normal blind 6 contours L5 L6 L11 L16 L15 L9 L14 L8 L13 L12 L7
fillet "모깎기5" radius 1 1 edges at (14.6, -42.6, 3)
sketch "스케치8" plane through (0, 0, 6) normal (0, 0, 1) x (1, 0, 0)
  circle A0 centre (11, -45.3) radius 1.35 projected
  circle A1 centre (17.3, -40) radius 1.35 projected
  circle A2 centre (17.3, -18) radius 1.35 projected
  circle A3 centre (17.3, 4) radius 1.35 projected
  line L0 (36.1, -20.6) -> (33.9, -20.6) projected
  line L1 (33.9, -20.6) -> (33.9, -15.4) projected
  line L2 (33.9, -15.4) -> (36.1, -15.4) projected
  line L3 (36.1, -15.4) -> (36.1, -20.6) projected
  line L4 (33.9, 1.4) -> (33.9, 6.6) projected
  line L5 (33.9, 6.6) -> (36.1, 6.6) projected
  line L6 (36.1, 6.6) -> (36.1, 1.4) projected
  line L7 (36.1, 1.4) -> (33.9, 1.4) projected
  line L8 (14.6, -48) -> (20, -42.6) projected
  line L9 (20, -42.6) -> (20, -34.5) projected
  line L10 (20, -34.5) -> (43, -34.5) projected
  line L11 (43, -34.5) -> (43, 11.5) projected
  line L12 (43, 11.5) -> (14.6, 11.5) projected
  line L13 (14.6, 11.5) -> (14.6, -41.6) projected
  arc A4 (13.6, -42.6) -> (14.6, -41.6) centre (13.6, -41.6) ccw projected
  line L14 (13.6, -42.6) -> (0, -42.6) projected
  line L15 (0, -48) -> (14.6, -48) projected
  line L16 (0, -42.6) -> (0, -48) projected
  line L17 (43, -34.5) -> (19.4142, -34.5)
  line L18 (19.4142, -34.5) -> (19.4142, -43.1858)
  line L19 (14.6, -48) -> (43, -34.5)
  line L20 (19.4142, -43.1858) -> (14.6, -48)
  point P0 (0, 0)
extrude "돌출12" add sketch "스케치8" against normal blind 6 contours L8 L9 L10 L19
mirror "미러2" about plane through (0, -48, 6) normal (-1, 0, 0)
properties part number "connecting plate under body" material "PMMA 플라스틱"
